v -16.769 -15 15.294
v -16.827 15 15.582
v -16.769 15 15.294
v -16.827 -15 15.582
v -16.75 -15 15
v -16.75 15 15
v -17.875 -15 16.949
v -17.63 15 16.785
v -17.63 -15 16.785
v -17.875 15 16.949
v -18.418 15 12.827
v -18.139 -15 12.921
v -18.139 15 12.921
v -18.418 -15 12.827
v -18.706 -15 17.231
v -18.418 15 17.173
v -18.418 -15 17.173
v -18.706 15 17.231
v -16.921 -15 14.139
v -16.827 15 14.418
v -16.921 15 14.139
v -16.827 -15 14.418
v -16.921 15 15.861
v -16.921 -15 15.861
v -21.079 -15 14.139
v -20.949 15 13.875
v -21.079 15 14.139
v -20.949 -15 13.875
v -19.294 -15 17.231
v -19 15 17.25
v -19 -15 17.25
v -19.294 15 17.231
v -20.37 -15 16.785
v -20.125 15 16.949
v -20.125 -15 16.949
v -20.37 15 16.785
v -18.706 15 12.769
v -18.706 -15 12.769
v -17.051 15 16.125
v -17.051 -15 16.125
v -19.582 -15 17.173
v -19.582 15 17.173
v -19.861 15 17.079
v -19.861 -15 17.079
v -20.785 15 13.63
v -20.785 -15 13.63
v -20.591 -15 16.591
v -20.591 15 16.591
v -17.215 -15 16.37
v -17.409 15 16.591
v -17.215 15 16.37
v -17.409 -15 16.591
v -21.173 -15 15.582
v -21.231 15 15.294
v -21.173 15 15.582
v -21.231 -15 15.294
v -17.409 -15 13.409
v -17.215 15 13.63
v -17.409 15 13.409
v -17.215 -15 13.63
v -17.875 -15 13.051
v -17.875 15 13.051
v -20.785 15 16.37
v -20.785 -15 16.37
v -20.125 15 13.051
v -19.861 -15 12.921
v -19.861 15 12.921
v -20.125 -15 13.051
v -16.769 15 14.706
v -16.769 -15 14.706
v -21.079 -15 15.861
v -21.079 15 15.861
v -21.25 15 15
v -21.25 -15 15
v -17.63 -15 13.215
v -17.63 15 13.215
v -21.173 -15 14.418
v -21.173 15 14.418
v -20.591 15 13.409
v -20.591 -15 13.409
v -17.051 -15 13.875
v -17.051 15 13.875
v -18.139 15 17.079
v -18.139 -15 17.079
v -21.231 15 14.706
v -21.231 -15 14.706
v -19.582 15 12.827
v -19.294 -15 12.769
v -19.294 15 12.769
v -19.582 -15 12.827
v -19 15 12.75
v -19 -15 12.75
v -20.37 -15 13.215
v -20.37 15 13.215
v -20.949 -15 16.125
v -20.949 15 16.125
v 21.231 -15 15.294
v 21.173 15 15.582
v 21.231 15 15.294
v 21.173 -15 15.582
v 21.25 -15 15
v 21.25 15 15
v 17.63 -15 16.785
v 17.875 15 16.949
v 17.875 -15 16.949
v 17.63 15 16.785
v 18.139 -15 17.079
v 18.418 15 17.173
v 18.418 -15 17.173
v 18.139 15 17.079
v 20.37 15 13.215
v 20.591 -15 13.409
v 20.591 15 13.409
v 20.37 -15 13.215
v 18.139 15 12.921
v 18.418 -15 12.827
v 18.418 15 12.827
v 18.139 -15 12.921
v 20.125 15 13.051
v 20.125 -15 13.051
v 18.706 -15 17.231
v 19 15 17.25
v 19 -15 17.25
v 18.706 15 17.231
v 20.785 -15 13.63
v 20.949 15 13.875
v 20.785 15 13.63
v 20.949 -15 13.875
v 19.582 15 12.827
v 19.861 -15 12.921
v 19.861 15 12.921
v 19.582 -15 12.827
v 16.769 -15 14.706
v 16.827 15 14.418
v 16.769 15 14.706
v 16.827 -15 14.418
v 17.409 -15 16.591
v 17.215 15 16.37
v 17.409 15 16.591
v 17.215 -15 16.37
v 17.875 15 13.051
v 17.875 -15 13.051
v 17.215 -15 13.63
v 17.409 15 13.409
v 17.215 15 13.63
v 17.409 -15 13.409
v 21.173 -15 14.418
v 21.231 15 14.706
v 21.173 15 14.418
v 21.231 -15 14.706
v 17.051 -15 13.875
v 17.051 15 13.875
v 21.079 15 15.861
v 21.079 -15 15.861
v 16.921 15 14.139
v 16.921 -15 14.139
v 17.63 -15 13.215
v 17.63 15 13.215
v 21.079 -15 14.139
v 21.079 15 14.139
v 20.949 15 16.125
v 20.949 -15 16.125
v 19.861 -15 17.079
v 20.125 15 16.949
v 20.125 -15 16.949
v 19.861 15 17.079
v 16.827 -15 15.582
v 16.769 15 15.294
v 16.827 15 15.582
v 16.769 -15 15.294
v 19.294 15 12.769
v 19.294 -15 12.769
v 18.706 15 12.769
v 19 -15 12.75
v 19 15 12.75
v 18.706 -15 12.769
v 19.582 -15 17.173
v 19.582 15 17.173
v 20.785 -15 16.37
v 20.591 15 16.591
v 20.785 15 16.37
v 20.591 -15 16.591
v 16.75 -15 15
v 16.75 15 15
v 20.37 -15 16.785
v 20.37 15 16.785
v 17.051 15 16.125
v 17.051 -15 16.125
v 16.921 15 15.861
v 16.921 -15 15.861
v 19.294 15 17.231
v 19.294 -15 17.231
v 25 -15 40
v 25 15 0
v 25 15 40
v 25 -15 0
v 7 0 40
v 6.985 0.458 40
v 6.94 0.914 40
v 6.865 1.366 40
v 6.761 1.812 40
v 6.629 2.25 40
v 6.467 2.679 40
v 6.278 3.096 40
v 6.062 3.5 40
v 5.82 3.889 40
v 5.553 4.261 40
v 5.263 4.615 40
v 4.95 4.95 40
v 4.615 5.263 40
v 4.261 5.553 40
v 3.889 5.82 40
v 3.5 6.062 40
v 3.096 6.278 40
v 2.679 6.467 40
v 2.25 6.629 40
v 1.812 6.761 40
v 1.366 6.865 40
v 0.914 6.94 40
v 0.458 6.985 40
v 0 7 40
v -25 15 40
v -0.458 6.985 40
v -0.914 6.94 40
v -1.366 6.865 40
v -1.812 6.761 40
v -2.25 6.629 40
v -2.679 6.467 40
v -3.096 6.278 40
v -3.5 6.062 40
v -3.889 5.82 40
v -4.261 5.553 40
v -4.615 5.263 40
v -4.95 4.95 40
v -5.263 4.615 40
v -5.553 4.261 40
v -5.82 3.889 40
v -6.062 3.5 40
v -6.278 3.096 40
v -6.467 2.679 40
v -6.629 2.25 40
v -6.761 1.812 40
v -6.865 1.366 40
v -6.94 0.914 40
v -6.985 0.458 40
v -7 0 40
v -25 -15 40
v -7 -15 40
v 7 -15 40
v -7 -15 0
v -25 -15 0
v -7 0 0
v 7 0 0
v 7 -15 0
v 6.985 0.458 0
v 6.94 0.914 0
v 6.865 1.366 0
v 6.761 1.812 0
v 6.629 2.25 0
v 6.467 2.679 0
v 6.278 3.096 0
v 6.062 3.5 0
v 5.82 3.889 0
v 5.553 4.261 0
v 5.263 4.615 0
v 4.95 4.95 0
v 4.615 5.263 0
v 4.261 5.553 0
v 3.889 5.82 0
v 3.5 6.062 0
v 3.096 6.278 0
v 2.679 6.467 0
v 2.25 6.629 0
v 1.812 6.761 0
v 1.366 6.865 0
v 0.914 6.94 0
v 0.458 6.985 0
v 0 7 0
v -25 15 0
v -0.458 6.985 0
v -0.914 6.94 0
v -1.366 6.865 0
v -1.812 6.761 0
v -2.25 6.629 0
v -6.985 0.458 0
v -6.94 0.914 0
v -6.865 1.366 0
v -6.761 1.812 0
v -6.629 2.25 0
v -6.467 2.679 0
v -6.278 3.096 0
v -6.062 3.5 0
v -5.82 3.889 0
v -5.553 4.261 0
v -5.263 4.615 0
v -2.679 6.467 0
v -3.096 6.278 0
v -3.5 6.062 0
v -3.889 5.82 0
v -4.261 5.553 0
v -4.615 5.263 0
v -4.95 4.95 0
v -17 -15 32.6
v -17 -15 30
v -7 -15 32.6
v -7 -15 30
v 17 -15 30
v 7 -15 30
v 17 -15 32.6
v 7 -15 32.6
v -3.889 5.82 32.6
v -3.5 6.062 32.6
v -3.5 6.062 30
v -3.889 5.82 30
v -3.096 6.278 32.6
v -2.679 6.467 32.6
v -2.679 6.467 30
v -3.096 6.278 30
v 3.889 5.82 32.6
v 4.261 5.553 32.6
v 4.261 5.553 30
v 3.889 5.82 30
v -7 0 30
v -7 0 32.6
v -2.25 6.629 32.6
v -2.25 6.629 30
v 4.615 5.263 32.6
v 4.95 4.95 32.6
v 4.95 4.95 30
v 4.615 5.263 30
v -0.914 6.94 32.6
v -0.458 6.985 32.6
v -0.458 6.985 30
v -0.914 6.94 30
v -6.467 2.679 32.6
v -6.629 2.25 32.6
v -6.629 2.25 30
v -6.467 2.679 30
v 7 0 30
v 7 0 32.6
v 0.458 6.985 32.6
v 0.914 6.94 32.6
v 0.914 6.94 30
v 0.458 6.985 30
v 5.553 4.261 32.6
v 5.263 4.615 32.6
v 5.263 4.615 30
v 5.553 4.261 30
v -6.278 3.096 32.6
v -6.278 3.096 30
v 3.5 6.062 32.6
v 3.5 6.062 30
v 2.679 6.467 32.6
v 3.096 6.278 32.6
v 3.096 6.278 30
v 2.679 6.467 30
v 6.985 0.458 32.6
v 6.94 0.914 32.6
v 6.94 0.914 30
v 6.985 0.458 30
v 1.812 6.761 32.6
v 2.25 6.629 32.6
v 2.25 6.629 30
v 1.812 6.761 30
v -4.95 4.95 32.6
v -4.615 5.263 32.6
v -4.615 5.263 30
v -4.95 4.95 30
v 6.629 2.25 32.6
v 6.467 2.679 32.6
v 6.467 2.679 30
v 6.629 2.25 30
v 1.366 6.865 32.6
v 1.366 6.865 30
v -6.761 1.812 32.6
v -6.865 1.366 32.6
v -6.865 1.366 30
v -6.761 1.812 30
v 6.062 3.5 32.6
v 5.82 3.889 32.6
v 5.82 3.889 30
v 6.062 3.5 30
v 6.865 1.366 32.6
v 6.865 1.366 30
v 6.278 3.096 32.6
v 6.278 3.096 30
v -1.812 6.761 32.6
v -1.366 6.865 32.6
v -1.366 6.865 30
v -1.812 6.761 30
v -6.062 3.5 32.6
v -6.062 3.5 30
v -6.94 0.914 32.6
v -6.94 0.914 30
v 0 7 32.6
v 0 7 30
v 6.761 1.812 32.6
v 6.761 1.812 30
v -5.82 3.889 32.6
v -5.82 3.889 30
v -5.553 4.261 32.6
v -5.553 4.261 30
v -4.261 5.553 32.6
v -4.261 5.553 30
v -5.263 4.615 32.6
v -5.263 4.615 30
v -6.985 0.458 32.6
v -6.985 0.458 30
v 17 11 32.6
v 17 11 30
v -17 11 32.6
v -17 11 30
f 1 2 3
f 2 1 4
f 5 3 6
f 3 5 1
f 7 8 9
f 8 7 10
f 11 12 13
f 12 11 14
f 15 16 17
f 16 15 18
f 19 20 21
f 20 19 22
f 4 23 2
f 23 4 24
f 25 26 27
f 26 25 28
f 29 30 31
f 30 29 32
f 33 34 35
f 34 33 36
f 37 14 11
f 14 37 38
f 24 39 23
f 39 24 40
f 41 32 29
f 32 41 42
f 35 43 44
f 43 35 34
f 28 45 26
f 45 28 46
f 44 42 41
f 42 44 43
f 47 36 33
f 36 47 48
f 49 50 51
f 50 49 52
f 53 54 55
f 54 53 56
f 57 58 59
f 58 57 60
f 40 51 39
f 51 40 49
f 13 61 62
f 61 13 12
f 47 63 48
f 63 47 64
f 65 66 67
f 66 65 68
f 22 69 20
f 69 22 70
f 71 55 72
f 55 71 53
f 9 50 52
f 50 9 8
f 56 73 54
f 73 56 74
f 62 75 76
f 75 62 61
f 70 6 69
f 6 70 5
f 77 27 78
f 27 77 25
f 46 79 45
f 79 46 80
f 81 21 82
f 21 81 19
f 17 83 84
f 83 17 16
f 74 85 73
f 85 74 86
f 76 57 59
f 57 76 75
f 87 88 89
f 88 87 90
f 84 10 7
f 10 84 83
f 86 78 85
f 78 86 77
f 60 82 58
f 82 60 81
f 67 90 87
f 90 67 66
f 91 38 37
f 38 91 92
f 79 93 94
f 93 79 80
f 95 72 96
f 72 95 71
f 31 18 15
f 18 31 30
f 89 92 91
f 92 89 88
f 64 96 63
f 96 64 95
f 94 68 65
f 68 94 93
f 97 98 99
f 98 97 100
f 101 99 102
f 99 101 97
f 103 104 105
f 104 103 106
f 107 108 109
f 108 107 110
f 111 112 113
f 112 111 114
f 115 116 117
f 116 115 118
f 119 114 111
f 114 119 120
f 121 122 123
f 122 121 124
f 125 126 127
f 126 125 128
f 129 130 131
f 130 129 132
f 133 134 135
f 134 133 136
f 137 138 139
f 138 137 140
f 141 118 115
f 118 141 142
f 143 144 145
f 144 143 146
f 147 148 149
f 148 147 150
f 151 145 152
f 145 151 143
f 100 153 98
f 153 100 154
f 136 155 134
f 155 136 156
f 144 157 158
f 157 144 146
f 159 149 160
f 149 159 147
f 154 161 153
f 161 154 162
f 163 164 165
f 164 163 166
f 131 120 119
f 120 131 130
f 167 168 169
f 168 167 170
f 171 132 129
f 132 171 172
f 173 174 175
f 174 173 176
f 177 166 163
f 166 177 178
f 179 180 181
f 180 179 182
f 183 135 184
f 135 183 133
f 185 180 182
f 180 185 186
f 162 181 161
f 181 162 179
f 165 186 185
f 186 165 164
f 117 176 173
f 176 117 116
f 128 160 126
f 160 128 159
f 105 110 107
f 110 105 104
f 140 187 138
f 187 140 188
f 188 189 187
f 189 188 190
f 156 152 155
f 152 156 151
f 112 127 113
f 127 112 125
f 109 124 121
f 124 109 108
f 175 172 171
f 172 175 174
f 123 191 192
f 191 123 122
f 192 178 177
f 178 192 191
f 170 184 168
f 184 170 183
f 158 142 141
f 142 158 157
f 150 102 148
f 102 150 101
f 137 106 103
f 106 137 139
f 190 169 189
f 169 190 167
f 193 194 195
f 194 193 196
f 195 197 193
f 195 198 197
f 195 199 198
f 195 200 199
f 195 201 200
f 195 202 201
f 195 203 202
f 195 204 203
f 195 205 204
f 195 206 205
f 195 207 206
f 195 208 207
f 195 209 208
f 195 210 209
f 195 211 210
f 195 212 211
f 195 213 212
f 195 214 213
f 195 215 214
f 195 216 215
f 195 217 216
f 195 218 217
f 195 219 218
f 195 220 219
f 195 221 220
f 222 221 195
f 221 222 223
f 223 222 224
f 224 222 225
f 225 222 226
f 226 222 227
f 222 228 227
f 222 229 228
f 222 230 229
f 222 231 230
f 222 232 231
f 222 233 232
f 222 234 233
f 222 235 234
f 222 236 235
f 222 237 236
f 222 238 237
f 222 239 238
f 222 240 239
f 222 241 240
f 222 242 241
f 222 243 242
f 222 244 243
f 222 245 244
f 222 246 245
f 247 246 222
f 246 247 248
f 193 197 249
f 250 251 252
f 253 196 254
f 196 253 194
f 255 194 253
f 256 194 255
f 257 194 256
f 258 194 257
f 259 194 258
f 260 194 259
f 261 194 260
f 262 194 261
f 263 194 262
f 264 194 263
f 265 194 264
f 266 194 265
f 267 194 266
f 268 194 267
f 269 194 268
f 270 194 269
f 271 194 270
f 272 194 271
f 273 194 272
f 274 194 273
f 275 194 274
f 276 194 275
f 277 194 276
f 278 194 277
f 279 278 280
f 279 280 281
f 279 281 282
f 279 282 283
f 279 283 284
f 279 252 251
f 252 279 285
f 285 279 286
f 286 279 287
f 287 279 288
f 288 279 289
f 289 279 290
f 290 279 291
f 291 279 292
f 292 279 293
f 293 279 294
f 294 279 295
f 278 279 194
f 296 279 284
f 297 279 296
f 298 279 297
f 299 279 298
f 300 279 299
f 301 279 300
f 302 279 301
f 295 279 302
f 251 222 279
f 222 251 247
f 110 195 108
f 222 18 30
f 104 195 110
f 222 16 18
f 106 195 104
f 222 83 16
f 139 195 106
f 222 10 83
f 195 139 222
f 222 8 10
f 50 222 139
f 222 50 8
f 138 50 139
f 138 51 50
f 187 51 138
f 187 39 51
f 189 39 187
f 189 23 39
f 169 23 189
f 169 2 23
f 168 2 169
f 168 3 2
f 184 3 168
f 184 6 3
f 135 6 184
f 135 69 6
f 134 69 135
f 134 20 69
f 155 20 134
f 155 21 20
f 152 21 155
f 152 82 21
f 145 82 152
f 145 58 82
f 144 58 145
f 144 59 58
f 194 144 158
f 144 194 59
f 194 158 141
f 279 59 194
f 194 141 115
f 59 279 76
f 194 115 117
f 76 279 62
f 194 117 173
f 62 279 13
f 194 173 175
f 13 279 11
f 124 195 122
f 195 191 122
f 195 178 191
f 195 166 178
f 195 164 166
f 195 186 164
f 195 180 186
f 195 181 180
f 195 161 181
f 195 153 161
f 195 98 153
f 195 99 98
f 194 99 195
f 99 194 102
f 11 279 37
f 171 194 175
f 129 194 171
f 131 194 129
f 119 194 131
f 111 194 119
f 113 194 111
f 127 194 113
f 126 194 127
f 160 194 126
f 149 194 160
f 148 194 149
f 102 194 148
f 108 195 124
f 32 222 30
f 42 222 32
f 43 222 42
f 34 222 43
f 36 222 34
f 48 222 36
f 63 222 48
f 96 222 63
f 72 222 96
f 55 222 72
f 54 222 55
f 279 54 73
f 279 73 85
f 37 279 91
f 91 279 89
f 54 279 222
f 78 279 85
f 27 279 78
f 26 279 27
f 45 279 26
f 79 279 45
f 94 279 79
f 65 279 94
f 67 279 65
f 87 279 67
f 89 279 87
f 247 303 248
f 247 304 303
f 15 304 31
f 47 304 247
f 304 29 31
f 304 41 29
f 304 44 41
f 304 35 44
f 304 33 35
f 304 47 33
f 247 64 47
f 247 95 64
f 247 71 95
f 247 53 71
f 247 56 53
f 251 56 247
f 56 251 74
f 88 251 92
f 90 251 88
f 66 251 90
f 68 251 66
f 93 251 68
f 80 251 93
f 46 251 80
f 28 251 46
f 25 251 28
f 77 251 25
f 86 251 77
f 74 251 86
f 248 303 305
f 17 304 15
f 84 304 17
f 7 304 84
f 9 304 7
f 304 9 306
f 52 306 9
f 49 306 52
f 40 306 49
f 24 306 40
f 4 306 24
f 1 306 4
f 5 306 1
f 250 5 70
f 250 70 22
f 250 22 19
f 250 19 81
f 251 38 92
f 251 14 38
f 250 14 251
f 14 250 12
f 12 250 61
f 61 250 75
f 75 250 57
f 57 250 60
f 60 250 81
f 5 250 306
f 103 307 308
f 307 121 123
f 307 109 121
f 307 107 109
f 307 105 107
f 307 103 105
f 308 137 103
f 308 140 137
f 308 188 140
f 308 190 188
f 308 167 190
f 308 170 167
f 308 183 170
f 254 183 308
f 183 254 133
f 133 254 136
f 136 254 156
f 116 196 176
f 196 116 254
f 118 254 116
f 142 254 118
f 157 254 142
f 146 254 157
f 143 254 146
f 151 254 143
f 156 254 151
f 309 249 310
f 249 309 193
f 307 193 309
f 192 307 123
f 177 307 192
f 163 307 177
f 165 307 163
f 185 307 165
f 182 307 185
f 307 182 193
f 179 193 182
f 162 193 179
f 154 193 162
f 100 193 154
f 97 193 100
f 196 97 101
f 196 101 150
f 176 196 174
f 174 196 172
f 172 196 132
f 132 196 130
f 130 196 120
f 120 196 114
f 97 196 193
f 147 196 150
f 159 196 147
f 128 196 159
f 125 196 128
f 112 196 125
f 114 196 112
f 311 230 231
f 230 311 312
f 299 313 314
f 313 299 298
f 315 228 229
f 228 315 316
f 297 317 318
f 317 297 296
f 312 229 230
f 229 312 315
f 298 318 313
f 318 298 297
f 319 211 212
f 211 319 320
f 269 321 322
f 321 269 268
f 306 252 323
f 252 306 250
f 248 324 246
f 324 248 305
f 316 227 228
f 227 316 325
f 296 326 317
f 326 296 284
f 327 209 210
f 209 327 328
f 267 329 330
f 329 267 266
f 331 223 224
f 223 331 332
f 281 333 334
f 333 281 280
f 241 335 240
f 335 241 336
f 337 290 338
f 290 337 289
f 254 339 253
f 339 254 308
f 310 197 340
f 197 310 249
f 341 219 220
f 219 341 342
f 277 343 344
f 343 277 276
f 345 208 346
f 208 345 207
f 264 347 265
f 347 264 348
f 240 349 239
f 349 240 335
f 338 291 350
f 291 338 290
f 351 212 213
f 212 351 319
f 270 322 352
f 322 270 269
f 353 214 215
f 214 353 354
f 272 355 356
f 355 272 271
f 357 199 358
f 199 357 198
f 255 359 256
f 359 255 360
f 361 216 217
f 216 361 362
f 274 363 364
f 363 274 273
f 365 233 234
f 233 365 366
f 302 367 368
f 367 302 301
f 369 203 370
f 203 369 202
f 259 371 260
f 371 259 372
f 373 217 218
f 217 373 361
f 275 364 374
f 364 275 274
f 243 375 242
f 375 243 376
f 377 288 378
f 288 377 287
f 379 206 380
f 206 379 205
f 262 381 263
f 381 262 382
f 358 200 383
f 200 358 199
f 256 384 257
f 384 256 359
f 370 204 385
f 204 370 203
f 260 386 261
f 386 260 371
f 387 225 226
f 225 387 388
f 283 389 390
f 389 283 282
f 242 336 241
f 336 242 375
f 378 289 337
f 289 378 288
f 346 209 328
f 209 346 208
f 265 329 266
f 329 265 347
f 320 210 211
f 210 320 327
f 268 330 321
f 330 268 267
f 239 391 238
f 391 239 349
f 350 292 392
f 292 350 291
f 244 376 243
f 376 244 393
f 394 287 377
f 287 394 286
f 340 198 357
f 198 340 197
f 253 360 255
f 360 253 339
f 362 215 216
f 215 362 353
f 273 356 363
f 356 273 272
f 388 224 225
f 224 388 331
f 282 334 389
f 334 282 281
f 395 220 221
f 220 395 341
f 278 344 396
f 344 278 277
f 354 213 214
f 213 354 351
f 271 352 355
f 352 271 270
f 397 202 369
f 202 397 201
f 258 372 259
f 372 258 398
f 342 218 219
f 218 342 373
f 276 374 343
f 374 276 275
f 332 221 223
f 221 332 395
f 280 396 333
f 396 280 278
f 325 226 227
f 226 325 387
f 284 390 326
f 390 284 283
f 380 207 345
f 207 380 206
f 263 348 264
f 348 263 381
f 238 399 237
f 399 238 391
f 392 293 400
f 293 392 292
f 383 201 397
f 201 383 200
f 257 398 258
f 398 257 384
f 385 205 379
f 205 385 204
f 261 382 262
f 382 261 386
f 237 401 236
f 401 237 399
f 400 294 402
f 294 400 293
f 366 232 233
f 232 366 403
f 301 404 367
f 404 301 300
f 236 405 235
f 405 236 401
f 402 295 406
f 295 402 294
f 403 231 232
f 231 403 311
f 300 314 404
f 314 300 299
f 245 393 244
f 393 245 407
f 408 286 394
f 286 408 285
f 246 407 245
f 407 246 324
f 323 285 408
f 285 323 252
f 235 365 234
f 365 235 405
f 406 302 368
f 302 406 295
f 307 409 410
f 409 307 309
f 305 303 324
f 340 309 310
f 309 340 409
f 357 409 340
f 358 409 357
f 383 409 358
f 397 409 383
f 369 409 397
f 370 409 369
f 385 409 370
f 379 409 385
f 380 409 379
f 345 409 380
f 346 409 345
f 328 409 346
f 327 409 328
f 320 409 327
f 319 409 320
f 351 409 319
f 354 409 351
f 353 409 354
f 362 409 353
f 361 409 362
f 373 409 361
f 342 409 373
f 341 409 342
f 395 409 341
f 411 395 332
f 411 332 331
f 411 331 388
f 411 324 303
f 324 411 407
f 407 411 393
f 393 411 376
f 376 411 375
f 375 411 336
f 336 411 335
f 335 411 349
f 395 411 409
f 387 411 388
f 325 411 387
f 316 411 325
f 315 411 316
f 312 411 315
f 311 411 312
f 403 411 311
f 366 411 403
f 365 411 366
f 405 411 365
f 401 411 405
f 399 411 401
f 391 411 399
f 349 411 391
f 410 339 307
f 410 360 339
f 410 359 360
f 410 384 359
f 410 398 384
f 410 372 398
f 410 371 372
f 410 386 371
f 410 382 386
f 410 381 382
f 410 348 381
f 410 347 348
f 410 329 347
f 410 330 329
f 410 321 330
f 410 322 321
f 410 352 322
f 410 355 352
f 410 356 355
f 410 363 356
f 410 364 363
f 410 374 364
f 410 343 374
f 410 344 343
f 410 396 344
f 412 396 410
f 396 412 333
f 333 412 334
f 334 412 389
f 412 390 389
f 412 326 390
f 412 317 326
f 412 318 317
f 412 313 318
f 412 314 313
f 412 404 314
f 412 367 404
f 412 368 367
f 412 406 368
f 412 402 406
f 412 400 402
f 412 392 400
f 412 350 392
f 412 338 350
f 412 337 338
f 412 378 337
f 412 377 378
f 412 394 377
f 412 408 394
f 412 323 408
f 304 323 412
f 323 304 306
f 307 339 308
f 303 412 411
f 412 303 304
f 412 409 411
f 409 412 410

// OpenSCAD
// KNOWN-WRONG PART (must fail): the barrel channel is 14 mm wide (too narrow for the barrel)
// Wall-mounted holder for a 10 mL syringe hanging upright, tip down (gravity-feed reservoir)
// Category: hardware. A block with a vertical U-shaped barrel channel open at the front, a
// horizontal slot that takes the finger flange, and two M4 wall-screw holes from front to back.
// Print: PETG or PLA, standing on its bottom face; the flange slot roof bridges 34 mm.
// SPDX-License-Identifier: CERN-OHL-P-2.0

/* [Holder] */
block = [50, 30, 40];     // X (width), Y (depth), Z (height) [mm]; back face at y = +15
channel_w = 14;           // 16 mm barrel + clearance; half-circle back end centred at (0, 0)
slot = [34, 2.6];         // flange slot width (X) and height (Z)
slot_z = 30;              // slot from z = 30 to 32.6
slot_back_y = 11;         // the slot reaches from the front face back to y = 11
screw_d = 4.5;            // M4 clearance
screw_x = 19;
screw_z = 15;

/* [Hidden] */
eps = 0.01;

difference() {
    translate([-block.x / 2, -block.y / 2, 0]) cube(block);
    // barrel channel, open toward -Y (the front)
    translate([0, 0, -1]) linear_extrude(block.z + 2) {
        circle(d = channel_w, $fn = 96);
        translate([-channel_w / 2, -block.y / 2 - 1]) square([channel_w, block.y / 2 + 1]);
    }
    // flange slot, cut in from the front face
    translate([-slot.x / 2, -block.y / 2 - 1, slot_z]) cube([slot.x, slot_back_y + block.y / 2 + 1, slot.y]);
    // wall-screw holes, front to back
    for (s = [-1, 1])
        translate([s * screw_x, 0, screw_z]) rotate([90, 0, 0])
            cylinder(d = screw_d, h = block.y + 2, center = true, $fn = 48);
}
